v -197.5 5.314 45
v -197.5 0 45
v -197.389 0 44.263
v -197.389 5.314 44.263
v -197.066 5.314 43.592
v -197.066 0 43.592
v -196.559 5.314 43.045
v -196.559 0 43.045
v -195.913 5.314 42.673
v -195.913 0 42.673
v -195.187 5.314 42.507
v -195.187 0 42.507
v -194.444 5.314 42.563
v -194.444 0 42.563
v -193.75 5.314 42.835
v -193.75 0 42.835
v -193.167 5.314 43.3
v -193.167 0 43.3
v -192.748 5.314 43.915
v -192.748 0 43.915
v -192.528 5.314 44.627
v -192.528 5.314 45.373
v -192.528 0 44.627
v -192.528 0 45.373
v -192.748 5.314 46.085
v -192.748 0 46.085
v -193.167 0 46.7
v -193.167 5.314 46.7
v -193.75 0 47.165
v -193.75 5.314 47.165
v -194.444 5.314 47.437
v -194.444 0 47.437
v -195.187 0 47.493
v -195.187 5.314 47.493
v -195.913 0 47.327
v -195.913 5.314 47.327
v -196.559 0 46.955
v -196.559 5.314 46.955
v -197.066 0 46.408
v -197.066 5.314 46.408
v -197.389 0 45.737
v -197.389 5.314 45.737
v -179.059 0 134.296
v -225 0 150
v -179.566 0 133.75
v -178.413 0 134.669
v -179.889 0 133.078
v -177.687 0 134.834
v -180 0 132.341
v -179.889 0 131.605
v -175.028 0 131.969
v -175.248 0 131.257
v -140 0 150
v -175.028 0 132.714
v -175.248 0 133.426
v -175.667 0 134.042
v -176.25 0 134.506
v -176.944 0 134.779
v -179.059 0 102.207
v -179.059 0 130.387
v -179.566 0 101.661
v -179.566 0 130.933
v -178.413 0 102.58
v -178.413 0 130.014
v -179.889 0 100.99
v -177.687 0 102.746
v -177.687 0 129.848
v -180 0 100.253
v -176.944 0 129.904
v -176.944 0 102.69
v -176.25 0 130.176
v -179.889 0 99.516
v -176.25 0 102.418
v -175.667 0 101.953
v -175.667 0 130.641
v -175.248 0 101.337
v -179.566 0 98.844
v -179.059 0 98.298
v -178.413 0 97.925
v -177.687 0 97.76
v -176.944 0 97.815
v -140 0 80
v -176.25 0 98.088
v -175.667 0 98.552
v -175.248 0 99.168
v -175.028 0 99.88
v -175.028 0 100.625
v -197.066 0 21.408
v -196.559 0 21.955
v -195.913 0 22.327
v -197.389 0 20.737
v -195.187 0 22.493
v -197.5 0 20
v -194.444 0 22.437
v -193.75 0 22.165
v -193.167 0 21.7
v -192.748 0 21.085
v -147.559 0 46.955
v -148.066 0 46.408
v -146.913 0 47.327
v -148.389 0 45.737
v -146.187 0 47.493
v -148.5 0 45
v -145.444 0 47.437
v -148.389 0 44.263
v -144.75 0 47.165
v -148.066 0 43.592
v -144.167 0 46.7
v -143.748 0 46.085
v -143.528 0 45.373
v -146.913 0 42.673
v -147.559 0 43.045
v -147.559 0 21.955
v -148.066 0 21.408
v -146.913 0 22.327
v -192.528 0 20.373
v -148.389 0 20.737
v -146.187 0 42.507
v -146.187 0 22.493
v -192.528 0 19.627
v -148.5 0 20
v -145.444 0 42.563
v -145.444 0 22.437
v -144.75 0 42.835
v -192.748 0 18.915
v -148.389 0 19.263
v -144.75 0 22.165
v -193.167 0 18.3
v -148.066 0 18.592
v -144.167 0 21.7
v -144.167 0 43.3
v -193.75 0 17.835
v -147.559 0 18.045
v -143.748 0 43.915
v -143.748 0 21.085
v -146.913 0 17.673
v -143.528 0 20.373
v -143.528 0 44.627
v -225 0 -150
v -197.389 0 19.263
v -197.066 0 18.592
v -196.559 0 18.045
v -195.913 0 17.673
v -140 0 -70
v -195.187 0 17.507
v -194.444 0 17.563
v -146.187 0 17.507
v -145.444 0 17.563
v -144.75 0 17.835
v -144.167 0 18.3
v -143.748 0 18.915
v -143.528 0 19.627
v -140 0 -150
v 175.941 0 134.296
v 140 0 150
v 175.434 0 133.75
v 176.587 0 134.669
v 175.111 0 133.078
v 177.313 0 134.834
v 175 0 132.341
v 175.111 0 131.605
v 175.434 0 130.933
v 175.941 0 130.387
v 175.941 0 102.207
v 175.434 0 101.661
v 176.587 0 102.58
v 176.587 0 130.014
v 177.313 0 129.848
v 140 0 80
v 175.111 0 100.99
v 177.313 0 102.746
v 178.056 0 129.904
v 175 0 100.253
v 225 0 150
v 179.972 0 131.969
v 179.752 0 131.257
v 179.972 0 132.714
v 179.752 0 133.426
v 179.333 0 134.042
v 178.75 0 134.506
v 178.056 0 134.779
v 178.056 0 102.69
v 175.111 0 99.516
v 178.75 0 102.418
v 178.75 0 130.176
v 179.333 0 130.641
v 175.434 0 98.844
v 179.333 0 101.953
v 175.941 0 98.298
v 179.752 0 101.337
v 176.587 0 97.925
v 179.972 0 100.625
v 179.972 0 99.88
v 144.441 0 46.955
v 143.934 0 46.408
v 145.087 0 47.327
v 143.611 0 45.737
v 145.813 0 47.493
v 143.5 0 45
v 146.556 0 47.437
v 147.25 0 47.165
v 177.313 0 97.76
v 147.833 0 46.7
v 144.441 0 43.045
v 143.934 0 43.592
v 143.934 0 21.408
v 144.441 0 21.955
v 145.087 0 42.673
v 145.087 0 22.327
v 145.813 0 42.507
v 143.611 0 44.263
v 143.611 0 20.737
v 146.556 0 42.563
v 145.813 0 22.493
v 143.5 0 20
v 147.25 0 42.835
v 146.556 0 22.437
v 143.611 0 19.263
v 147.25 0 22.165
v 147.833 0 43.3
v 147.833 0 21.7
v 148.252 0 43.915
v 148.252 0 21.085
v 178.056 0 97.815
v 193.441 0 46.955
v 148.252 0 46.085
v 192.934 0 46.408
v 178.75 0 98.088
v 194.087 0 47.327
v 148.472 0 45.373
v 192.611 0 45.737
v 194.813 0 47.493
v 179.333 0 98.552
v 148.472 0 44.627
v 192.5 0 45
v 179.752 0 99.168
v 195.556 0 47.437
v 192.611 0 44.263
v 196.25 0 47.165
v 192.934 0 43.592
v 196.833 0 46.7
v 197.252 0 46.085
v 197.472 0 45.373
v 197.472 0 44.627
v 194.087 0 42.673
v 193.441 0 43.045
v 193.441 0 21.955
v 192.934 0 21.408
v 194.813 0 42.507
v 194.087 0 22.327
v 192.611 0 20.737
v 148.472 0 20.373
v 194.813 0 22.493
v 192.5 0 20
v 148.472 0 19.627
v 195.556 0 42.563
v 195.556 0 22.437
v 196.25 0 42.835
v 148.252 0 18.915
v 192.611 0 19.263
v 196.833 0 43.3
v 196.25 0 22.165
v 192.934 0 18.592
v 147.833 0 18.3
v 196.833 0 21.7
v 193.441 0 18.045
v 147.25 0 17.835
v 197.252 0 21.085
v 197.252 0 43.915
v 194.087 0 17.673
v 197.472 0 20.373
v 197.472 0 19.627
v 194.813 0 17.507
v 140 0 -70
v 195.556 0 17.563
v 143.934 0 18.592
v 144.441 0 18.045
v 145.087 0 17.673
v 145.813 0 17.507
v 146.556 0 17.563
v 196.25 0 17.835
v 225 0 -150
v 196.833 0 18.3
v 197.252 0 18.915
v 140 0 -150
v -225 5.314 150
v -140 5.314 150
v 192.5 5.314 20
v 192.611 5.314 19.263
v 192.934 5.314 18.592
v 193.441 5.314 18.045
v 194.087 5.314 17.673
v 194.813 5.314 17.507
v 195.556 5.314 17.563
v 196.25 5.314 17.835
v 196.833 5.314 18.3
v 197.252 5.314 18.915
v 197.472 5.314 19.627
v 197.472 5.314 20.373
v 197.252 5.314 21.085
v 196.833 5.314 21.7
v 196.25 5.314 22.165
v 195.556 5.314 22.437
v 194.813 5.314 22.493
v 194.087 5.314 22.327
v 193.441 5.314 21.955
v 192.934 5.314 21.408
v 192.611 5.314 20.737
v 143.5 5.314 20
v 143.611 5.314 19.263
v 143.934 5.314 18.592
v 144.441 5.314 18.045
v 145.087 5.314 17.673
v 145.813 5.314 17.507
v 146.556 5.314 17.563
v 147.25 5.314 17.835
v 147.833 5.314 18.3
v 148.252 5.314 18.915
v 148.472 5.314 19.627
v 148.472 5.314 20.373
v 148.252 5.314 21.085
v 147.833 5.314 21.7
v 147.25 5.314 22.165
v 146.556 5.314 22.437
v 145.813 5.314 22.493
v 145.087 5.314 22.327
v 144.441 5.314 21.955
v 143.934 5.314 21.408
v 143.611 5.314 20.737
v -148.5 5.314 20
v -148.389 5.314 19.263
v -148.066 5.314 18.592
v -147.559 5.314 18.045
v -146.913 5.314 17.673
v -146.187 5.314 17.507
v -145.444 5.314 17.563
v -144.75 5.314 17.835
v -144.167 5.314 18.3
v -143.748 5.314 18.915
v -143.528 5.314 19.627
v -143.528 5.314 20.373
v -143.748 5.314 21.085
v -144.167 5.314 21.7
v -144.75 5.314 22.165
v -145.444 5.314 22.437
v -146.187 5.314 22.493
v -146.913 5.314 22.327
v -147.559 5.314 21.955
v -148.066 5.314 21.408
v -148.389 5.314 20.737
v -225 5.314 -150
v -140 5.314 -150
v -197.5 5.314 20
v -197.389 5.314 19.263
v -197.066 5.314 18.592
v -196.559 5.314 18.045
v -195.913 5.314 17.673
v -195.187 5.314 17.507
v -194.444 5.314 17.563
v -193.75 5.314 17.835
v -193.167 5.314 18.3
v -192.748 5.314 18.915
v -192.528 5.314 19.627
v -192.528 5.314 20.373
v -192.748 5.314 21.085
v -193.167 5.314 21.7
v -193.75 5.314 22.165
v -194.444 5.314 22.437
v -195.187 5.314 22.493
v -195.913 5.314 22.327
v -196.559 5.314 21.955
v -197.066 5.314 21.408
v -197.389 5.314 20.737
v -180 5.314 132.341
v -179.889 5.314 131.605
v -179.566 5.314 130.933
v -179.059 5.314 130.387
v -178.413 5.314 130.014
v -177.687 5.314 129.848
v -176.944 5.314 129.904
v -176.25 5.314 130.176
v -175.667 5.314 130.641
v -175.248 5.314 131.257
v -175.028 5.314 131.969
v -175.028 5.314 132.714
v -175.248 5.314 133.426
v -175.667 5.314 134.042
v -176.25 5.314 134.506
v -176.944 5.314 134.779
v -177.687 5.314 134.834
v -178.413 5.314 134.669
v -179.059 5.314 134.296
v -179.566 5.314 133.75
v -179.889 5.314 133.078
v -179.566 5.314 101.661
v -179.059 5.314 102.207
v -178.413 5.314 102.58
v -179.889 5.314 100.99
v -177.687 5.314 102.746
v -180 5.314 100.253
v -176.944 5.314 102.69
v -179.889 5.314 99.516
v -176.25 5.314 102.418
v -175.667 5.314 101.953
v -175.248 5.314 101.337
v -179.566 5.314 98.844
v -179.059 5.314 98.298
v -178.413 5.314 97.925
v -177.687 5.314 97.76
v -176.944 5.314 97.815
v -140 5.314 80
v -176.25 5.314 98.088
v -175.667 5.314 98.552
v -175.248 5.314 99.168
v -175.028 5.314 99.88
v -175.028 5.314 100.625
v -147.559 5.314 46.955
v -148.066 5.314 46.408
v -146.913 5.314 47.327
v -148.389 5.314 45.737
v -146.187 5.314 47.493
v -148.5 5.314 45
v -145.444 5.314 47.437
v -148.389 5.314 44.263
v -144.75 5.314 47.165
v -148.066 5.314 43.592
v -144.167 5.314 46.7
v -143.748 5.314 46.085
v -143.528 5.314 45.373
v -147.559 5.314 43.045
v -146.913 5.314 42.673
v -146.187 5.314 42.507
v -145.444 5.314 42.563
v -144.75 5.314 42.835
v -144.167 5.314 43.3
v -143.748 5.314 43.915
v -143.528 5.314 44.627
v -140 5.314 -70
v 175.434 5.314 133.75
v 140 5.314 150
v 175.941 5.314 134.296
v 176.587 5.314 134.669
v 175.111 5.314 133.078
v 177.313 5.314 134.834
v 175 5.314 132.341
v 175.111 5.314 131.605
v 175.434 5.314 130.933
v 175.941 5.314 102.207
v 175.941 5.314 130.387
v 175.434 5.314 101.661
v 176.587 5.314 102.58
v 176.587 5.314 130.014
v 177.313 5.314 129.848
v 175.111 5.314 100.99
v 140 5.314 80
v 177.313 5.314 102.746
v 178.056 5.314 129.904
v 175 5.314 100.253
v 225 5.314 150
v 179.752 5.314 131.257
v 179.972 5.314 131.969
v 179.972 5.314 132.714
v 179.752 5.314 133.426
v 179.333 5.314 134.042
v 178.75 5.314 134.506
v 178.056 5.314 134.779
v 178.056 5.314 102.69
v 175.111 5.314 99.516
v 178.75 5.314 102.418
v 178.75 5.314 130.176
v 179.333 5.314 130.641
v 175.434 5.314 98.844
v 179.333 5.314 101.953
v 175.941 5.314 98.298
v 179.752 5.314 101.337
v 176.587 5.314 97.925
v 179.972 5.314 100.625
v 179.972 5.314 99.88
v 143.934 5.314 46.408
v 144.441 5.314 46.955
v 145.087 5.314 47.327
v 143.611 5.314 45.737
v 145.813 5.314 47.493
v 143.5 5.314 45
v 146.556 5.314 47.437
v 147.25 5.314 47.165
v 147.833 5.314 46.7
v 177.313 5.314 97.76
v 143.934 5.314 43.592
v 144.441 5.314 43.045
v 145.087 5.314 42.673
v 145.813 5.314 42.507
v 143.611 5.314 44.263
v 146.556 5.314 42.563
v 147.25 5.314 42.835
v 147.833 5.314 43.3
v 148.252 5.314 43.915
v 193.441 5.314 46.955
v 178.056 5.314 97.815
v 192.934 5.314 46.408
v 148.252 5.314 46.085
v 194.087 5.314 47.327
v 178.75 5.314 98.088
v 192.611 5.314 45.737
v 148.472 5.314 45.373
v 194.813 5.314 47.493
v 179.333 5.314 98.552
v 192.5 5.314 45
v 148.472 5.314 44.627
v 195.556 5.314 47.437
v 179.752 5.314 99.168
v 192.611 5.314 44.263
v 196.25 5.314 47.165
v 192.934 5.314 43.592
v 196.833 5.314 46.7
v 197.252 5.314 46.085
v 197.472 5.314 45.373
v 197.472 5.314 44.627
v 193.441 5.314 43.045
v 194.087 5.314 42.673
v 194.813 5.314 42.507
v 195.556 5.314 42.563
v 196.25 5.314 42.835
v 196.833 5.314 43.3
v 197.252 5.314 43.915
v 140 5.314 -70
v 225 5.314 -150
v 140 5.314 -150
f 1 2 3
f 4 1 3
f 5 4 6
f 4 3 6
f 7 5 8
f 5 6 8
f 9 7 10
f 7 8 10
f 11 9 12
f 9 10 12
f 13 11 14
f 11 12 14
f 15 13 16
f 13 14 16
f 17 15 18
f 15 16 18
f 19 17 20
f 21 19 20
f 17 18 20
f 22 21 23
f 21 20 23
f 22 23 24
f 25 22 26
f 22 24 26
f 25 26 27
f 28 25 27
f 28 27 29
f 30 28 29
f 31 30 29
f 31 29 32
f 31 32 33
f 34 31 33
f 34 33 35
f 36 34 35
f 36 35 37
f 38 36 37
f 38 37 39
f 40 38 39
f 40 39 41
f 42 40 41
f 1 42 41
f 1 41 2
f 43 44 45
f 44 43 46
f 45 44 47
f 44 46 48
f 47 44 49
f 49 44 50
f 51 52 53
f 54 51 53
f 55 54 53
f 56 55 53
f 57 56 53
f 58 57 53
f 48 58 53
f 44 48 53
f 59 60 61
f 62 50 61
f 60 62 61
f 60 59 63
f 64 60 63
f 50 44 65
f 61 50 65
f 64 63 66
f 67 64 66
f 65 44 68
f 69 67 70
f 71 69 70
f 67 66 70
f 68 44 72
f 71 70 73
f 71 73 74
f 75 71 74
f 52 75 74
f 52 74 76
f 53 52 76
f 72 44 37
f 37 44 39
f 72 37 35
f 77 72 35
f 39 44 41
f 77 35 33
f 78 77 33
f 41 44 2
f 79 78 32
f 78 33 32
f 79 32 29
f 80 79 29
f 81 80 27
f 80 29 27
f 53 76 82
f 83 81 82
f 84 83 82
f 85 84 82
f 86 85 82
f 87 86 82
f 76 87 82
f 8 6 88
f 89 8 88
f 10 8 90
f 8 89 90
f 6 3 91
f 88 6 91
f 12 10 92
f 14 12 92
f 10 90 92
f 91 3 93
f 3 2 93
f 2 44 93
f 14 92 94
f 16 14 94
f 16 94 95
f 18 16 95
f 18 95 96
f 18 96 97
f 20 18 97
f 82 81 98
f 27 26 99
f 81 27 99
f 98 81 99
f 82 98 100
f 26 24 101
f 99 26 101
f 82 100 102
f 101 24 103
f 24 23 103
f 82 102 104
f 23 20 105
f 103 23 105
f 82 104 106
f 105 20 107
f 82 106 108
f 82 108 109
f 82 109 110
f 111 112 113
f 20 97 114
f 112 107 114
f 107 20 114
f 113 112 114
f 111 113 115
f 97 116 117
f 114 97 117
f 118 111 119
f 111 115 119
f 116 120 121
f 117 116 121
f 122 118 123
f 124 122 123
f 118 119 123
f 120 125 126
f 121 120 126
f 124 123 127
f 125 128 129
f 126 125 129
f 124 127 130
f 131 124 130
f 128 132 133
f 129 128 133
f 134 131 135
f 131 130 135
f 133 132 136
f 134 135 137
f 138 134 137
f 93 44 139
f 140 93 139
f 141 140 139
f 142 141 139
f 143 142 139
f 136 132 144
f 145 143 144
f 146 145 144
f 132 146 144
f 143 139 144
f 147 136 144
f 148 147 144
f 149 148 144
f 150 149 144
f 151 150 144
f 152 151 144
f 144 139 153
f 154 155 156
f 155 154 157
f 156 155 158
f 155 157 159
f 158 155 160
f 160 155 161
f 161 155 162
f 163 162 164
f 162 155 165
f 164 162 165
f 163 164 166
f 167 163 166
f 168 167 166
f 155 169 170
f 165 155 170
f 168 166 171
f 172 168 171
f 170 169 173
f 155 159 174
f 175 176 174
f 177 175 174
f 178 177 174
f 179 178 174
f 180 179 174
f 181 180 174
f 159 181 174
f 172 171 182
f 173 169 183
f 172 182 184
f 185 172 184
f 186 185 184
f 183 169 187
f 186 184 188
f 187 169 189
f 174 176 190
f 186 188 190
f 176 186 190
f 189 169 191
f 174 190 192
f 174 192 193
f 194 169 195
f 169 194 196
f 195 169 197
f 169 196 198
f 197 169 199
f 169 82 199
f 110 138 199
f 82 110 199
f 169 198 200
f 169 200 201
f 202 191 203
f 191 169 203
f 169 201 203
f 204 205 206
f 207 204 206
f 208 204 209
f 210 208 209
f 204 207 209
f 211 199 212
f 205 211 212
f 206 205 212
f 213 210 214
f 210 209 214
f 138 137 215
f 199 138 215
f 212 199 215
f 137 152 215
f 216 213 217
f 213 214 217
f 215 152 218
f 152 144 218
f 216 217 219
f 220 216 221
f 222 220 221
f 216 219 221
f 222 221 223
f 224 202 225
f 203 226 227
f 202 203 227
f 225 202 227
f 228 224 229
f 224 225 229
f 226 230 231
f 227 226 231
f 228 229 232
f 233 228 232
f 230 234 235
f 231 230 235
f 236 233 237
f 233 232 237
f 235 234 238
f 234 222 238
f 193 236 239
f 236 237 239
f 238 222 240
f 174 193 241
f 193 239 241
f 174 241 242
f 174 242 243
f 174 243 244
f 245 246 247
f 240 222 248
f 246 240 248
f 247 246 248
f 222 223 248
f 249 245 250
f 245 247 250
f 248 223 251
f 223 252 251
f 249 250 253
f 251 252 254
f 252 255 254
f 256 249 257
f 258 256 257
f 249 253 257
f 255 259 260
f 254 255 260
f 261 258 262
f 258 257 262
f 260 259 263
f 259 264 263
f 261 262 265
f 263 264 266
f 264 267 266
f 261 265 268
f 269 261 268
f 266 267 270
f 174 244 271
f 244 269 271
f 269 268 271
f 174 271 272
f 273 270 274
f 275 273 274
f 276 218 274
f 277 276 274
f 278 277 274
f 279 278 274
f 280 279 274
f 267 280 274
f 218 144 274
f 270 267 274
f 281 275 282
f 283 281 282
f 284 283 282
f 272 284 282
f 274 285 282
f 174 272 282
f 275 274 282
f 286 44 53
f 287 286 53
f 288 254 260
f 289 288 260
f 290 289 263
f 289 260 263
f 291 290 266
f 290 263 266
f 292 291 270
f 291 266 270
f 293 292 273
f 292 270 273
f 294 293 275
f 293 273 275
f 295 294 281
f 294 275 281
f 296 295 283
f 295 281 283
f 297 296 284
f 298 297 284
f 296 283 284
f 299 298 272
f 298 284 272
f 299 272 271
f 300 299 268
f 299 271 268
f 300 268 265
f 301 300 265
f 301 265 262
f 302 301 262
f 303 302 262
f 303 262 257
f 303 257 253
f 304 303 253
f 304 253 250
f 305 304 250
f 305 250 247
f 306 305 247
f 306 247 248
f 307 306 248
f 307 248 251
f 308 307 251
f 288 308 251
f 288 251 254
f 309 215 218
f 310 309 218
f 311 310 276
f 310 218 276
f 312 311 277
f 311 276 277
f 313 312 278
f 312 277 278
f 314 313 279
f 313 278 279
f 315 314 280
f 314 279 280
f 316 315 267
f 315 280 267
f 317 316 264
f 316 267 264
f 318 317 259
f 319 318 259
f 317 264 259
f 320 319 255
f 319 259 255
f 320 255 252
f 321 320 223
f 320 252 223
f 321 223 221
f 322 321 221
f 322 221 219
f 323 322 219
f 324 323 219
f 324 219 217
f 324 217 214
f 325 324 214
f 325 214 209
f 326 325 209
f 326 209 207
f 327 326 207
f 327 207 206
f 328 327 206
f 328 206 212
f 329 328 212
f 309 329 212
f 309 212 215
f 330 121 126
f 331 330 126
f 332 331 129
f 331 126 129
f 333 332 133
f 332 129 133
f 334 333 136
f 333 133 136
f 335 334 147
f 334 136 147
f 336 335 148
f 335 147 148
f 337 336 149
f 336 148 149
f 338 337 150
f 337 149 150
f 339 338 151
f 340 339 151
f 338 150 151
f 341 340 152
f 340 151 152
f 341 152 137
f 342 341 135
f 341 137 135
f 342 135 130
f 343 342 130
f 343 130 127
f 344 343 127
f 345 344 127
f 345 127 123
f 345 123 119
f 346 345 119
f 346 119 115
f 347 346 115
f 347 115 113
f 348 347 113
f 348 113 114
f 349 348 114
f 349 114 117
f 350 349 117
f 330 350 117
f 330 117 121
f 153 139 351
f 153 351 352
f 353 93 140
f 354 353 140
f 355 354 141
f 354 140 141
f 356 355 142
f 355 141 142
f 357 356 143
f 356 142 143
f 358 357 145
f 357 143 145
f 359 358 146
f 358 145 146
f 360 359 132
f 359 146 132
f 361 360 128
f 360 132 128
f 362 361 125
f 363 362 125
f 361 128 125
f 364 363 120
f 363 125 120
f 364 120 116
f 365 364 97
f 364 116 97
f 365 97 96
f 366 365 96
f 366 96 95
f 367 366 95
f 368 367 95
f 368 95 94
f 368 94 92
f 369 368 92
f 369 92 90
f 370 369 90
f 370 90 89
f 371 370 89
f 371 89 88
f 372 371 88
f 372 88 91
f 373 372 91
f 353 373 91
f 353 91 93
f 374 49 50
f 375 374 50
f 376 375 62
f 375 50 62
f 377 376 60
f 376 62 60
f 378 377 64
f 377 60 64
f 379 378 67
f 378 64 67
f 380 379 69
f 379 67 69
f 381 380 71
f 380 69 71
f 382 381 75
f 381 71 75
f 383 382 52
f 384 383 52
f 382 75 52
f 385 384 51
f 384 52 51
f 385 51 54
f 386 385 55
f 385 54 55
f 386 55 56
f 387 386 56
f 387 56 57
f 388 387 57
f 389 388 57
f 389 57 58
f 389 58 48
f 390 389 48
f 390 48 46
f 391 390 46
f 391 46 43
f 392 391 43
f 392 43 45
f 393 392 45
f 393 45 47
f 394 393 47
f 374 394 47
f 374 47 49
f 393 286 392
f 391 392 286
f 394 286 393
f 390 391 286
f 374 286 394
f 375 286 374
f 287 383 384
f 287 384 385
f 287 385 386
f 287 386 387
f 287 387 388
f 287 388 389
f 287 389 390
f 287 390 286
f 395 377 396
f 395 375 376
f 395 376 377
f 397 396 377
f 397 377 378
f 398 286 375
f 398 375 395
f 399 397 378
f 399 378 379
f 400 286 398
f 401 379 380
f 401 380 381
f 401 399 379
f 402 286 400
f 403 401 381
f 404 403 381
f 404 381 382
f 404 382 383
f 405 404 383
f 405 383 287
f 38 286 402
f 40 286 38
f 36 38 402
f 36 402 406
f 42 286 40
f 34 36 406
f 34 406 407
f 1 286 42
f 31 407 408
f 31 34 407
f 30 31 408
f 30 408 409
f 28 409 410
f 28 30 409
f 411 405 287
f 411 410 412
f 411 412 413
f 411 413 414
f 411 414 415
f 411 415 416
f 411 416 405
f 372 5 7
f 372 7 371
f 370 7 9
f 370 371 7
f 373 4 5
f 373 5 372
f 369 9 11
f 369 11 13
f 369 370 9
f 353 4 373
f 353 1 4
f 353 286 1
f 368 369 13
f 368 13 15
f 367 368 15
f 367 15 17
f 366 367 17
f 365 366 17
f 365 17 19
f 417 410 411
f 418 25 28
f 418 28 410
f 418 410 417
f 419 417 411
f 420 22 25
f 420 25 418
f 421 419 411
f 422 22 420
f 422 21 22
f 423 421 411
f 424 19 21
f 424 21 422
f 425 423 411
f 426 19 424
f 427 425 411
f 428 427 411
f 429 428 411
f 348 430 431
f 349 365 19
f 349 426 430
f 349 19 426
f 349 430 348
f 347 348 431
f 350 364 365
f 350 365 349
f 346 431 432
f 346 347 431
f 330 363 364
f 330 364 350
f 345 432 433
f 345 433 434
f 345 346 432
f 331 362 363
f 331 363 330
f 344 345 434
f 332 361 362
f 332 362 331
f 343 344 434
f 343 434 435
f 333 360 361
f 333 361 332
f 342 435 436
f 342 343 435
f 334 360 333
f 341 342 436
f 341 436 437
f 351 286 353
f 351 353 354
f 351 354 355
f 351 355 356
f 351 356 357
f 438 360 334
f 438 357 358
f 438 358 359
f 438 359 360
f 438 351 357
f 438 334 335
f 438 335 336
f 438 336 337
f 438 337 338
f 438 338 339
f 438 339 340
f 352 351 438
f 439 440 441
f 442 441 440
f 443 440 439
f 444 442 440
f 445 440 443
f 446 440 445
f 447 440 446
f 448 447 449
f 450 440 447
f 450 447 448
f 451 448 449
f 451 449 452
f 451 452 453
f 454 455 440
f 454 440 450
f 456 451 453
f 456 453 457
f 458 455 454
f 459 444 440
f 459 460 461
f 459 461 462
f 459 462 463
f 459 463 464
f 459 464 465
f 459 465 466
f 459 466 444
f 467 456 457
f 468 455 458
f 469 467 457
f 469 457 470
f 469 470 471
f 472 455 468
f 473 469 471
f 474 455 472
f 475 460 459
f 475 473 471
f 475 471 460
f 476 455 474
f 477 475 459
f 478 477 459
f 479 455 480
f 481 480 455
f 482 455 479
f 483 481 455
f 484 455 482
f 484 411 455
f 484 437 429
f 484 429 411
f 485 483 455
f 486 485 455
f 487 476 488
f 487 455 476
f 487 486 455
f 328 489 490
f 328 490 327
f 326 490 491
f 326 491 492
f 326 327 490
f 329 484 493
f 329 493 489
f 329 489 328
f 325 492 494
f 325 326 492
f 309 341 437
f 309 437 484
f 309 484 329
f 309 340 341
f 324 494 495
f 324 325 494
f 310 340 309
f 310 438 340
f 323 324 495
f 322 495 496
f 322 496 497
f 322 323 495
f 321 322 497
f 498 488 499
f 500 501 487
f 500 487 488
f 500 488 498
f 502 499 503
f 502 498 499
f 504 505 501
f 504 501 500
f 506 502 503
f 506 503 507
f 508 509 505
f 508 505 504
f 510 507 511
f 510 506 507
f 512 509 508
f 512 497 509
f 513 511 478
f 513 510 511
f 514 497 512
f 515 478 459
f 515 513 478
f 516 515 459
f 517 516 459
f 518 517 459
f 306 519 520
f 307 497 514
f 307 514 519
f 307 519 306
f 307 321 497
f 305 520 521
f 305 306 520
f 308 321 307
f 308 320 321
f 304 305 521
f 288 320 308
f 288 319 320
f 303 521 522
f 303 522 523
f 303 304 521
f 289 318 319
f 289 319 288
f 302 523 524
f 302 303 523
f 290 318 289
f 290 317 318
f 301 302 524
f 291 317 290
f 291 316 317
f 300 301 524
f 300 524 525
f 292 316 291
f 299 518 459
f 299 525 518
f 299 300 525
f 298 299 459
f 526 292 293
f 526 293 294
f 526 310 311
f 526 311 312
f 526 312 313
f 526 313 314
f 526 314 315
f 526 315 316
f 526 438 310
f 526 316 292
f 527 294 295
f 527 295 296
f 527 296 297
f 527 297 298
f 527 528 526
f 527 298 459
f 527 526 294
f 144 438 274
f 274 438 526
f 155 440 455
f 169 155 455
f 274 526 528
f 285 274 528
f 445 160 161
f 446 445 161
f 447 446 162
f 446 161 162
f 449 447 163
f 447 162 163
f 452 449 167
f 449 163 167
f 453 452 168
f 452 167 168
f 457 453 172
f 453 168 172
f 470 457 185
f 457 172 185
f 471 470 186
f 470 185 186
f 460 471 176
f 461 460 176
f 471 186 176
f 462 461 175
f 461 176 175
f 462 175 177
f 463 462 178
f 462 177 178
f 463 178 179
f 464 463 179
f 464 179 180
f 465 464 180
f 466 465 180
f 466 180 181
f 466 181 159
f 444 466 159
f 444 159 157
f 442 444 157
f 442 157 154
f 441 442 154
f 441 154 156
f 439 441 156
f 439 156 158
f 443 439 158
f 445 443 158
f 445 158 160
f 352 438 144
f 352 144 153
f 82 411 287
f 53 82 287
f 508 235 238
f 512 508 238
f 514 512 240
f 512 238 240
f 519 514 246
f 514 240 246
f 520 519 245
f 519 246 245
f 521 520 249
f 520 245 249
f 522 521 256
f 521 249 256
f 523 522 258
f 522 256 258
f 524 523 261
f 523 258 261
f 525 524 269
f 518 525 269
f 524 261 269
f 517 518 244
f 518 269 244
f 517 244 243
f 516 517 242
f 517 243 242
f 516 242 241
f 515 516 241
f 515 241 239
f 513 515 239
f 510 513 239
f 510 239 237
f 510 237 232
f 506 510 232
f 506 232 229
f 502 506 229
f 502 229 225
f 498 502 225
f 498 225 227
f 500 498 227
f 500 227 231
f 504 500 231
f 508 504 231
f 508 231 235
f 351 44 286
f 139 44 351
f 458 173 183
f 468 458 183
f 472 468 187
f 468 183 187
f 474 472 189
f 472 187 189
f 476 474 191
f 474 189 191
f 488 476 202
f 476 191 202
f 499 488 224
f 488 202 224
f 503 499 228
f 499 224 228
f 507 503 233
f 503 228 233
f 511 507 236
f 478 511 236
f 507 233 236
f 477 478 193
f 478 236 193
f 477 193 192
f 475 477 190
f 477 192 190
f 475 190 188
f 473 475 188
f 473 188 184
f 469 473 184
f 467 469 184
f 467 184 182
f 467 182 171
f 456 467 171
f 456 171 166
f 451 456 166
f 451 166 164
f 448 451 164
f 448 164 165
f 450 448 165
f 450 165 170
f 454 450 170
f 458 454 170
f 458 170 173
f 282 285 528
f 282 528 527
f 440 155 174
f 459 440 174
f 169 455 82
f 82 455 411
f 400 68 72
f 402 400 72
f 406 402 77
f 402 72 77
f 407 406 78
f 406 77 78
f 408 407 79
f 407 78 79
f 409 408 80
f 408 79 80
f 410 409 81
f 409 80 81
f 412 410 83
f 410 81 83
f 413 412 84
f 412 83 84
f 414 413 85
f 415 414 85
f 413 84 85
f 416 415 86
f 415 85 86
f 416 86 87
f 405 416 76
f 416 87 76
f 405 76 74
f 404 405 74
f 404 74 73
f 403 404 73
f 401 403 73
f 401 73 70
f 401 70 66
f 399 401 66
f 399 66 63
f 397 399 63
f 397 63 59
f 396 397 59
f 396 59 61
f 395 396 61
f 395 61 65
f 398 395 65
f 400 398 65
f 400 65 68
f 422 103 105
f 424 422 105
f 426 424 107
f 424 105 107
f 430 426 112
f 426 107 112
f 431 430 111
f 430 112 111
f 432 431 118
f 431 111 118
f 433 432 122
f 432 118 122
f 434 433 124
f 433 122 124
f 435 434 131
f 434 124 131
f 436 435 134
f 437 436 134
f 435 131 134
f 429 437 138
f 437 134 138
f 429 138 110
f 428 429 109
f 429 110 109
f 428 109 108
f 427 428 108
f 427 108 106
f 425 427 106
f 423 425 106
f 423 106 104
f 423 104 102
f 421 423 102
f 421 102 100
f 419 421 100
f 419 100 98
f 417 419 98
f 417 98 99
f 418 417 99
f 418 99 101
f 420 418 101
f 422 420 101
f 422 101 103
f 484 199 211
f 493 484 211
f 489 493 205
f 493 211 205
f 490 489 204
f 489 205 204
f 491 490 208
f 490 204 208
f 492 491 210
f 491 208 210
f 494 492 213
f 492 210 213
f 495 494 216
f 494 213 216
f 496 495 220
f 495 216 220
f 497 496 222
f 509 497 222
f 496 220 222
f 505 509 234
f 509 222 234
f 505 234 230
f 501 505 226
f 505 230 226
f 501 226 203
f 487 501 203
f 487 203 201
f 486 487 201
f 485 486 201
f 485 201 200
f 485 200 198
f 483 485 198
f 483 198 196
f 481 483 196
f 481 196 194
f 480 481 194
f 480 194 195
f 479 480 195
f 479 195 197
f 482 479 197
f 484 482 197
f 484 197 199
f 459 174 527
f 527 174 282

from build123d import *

# Parameters (mm, degrees)
SKETCH2_W                          = 450
SKETCH2_H                          = 300
BASE_DEPTH                         = 5.314
TAP_DRILL_FOR_M6X1_0_RACK_BOLTS_D  = 5
BACK_CUT_DEPTH                     = 271.468553802
TAP_DRILL_FOR_M6X1_0_MOTOR_BOLTS_D = 5
SKETCH10_W                         = 280
SKETCH10_H                         = 80
FRONT_CUT_DEPTH                    = 271.468553802


with BuildPart() as part:
    # Sketch2 → Base (new body)
    with BuildSketch(Plane(origin=(0, 0, 0), x_dir=(1, 0, 0), z_dir=(0, 1, 0))):
        Rectangle(SKETCH2_W, SKETCH2_H)
    extrude(amount=BASE_DEPTH)

    # Tap Drill for M6x1.0 rack bolts (through all)
    with Locations(Plane(origin=(0, 5.314, 0), x_dir=(1, 0, 0), z_dir=(0, 1, 0))):
        with Locations((-195, -45), (-146, -45), (-146, -20), (-195, -20), (146, -20), (195, -20), (195, -45), (146, -45)):
            Hole(TAP_DRILL_FOR_M6X1_0_RACK_BOLTS_D / 2)

    # Sketch7 → back cut (cut, through all)
    with BuildSketch(Plane(origin=(0, 5.314, 0), x_dir=(1, 0, 0), z_dir=(0, 1, 0))):
        Polygon((140, -80), (0, -80), (-140, -80), (-140, -150), (140, -150), align=None)
    extrude(amount=-BACK_CUT_DEPTH, mode=Mode.SUBTRACT)

    # Tap Drill for M6x1.0 motor bolts (through all)
    with Locations(Plane(origin=(0, 5.314, 0), x_dir=(1, 0, 0), z_dir=(0, 1, 0))):
        with Locations((-177.5, -100.252621879), (-177.5, -132.3413911), (177.5, -100.252621879), (177.5, -132.3413911)):
            Hole(TAP_DRILL_FOR_M6X1_0_MOTOR_BOLTS_D / 2)

    # Sketch10 → Front cut (cut, through all)
    with BuildSketch(Plane(origin=(0, 5.314, 0), x_dir=(1, 0, 0), z_dir=(0, 1, 0))):
        with Locations((0, 110)):
            Rectangle(SKETCH10_W, SKETCH10_H)
    extrude(amount=-FRONT_CUT_DEPTH, mode=Mode.SUBTRACT)


solid = part.part
